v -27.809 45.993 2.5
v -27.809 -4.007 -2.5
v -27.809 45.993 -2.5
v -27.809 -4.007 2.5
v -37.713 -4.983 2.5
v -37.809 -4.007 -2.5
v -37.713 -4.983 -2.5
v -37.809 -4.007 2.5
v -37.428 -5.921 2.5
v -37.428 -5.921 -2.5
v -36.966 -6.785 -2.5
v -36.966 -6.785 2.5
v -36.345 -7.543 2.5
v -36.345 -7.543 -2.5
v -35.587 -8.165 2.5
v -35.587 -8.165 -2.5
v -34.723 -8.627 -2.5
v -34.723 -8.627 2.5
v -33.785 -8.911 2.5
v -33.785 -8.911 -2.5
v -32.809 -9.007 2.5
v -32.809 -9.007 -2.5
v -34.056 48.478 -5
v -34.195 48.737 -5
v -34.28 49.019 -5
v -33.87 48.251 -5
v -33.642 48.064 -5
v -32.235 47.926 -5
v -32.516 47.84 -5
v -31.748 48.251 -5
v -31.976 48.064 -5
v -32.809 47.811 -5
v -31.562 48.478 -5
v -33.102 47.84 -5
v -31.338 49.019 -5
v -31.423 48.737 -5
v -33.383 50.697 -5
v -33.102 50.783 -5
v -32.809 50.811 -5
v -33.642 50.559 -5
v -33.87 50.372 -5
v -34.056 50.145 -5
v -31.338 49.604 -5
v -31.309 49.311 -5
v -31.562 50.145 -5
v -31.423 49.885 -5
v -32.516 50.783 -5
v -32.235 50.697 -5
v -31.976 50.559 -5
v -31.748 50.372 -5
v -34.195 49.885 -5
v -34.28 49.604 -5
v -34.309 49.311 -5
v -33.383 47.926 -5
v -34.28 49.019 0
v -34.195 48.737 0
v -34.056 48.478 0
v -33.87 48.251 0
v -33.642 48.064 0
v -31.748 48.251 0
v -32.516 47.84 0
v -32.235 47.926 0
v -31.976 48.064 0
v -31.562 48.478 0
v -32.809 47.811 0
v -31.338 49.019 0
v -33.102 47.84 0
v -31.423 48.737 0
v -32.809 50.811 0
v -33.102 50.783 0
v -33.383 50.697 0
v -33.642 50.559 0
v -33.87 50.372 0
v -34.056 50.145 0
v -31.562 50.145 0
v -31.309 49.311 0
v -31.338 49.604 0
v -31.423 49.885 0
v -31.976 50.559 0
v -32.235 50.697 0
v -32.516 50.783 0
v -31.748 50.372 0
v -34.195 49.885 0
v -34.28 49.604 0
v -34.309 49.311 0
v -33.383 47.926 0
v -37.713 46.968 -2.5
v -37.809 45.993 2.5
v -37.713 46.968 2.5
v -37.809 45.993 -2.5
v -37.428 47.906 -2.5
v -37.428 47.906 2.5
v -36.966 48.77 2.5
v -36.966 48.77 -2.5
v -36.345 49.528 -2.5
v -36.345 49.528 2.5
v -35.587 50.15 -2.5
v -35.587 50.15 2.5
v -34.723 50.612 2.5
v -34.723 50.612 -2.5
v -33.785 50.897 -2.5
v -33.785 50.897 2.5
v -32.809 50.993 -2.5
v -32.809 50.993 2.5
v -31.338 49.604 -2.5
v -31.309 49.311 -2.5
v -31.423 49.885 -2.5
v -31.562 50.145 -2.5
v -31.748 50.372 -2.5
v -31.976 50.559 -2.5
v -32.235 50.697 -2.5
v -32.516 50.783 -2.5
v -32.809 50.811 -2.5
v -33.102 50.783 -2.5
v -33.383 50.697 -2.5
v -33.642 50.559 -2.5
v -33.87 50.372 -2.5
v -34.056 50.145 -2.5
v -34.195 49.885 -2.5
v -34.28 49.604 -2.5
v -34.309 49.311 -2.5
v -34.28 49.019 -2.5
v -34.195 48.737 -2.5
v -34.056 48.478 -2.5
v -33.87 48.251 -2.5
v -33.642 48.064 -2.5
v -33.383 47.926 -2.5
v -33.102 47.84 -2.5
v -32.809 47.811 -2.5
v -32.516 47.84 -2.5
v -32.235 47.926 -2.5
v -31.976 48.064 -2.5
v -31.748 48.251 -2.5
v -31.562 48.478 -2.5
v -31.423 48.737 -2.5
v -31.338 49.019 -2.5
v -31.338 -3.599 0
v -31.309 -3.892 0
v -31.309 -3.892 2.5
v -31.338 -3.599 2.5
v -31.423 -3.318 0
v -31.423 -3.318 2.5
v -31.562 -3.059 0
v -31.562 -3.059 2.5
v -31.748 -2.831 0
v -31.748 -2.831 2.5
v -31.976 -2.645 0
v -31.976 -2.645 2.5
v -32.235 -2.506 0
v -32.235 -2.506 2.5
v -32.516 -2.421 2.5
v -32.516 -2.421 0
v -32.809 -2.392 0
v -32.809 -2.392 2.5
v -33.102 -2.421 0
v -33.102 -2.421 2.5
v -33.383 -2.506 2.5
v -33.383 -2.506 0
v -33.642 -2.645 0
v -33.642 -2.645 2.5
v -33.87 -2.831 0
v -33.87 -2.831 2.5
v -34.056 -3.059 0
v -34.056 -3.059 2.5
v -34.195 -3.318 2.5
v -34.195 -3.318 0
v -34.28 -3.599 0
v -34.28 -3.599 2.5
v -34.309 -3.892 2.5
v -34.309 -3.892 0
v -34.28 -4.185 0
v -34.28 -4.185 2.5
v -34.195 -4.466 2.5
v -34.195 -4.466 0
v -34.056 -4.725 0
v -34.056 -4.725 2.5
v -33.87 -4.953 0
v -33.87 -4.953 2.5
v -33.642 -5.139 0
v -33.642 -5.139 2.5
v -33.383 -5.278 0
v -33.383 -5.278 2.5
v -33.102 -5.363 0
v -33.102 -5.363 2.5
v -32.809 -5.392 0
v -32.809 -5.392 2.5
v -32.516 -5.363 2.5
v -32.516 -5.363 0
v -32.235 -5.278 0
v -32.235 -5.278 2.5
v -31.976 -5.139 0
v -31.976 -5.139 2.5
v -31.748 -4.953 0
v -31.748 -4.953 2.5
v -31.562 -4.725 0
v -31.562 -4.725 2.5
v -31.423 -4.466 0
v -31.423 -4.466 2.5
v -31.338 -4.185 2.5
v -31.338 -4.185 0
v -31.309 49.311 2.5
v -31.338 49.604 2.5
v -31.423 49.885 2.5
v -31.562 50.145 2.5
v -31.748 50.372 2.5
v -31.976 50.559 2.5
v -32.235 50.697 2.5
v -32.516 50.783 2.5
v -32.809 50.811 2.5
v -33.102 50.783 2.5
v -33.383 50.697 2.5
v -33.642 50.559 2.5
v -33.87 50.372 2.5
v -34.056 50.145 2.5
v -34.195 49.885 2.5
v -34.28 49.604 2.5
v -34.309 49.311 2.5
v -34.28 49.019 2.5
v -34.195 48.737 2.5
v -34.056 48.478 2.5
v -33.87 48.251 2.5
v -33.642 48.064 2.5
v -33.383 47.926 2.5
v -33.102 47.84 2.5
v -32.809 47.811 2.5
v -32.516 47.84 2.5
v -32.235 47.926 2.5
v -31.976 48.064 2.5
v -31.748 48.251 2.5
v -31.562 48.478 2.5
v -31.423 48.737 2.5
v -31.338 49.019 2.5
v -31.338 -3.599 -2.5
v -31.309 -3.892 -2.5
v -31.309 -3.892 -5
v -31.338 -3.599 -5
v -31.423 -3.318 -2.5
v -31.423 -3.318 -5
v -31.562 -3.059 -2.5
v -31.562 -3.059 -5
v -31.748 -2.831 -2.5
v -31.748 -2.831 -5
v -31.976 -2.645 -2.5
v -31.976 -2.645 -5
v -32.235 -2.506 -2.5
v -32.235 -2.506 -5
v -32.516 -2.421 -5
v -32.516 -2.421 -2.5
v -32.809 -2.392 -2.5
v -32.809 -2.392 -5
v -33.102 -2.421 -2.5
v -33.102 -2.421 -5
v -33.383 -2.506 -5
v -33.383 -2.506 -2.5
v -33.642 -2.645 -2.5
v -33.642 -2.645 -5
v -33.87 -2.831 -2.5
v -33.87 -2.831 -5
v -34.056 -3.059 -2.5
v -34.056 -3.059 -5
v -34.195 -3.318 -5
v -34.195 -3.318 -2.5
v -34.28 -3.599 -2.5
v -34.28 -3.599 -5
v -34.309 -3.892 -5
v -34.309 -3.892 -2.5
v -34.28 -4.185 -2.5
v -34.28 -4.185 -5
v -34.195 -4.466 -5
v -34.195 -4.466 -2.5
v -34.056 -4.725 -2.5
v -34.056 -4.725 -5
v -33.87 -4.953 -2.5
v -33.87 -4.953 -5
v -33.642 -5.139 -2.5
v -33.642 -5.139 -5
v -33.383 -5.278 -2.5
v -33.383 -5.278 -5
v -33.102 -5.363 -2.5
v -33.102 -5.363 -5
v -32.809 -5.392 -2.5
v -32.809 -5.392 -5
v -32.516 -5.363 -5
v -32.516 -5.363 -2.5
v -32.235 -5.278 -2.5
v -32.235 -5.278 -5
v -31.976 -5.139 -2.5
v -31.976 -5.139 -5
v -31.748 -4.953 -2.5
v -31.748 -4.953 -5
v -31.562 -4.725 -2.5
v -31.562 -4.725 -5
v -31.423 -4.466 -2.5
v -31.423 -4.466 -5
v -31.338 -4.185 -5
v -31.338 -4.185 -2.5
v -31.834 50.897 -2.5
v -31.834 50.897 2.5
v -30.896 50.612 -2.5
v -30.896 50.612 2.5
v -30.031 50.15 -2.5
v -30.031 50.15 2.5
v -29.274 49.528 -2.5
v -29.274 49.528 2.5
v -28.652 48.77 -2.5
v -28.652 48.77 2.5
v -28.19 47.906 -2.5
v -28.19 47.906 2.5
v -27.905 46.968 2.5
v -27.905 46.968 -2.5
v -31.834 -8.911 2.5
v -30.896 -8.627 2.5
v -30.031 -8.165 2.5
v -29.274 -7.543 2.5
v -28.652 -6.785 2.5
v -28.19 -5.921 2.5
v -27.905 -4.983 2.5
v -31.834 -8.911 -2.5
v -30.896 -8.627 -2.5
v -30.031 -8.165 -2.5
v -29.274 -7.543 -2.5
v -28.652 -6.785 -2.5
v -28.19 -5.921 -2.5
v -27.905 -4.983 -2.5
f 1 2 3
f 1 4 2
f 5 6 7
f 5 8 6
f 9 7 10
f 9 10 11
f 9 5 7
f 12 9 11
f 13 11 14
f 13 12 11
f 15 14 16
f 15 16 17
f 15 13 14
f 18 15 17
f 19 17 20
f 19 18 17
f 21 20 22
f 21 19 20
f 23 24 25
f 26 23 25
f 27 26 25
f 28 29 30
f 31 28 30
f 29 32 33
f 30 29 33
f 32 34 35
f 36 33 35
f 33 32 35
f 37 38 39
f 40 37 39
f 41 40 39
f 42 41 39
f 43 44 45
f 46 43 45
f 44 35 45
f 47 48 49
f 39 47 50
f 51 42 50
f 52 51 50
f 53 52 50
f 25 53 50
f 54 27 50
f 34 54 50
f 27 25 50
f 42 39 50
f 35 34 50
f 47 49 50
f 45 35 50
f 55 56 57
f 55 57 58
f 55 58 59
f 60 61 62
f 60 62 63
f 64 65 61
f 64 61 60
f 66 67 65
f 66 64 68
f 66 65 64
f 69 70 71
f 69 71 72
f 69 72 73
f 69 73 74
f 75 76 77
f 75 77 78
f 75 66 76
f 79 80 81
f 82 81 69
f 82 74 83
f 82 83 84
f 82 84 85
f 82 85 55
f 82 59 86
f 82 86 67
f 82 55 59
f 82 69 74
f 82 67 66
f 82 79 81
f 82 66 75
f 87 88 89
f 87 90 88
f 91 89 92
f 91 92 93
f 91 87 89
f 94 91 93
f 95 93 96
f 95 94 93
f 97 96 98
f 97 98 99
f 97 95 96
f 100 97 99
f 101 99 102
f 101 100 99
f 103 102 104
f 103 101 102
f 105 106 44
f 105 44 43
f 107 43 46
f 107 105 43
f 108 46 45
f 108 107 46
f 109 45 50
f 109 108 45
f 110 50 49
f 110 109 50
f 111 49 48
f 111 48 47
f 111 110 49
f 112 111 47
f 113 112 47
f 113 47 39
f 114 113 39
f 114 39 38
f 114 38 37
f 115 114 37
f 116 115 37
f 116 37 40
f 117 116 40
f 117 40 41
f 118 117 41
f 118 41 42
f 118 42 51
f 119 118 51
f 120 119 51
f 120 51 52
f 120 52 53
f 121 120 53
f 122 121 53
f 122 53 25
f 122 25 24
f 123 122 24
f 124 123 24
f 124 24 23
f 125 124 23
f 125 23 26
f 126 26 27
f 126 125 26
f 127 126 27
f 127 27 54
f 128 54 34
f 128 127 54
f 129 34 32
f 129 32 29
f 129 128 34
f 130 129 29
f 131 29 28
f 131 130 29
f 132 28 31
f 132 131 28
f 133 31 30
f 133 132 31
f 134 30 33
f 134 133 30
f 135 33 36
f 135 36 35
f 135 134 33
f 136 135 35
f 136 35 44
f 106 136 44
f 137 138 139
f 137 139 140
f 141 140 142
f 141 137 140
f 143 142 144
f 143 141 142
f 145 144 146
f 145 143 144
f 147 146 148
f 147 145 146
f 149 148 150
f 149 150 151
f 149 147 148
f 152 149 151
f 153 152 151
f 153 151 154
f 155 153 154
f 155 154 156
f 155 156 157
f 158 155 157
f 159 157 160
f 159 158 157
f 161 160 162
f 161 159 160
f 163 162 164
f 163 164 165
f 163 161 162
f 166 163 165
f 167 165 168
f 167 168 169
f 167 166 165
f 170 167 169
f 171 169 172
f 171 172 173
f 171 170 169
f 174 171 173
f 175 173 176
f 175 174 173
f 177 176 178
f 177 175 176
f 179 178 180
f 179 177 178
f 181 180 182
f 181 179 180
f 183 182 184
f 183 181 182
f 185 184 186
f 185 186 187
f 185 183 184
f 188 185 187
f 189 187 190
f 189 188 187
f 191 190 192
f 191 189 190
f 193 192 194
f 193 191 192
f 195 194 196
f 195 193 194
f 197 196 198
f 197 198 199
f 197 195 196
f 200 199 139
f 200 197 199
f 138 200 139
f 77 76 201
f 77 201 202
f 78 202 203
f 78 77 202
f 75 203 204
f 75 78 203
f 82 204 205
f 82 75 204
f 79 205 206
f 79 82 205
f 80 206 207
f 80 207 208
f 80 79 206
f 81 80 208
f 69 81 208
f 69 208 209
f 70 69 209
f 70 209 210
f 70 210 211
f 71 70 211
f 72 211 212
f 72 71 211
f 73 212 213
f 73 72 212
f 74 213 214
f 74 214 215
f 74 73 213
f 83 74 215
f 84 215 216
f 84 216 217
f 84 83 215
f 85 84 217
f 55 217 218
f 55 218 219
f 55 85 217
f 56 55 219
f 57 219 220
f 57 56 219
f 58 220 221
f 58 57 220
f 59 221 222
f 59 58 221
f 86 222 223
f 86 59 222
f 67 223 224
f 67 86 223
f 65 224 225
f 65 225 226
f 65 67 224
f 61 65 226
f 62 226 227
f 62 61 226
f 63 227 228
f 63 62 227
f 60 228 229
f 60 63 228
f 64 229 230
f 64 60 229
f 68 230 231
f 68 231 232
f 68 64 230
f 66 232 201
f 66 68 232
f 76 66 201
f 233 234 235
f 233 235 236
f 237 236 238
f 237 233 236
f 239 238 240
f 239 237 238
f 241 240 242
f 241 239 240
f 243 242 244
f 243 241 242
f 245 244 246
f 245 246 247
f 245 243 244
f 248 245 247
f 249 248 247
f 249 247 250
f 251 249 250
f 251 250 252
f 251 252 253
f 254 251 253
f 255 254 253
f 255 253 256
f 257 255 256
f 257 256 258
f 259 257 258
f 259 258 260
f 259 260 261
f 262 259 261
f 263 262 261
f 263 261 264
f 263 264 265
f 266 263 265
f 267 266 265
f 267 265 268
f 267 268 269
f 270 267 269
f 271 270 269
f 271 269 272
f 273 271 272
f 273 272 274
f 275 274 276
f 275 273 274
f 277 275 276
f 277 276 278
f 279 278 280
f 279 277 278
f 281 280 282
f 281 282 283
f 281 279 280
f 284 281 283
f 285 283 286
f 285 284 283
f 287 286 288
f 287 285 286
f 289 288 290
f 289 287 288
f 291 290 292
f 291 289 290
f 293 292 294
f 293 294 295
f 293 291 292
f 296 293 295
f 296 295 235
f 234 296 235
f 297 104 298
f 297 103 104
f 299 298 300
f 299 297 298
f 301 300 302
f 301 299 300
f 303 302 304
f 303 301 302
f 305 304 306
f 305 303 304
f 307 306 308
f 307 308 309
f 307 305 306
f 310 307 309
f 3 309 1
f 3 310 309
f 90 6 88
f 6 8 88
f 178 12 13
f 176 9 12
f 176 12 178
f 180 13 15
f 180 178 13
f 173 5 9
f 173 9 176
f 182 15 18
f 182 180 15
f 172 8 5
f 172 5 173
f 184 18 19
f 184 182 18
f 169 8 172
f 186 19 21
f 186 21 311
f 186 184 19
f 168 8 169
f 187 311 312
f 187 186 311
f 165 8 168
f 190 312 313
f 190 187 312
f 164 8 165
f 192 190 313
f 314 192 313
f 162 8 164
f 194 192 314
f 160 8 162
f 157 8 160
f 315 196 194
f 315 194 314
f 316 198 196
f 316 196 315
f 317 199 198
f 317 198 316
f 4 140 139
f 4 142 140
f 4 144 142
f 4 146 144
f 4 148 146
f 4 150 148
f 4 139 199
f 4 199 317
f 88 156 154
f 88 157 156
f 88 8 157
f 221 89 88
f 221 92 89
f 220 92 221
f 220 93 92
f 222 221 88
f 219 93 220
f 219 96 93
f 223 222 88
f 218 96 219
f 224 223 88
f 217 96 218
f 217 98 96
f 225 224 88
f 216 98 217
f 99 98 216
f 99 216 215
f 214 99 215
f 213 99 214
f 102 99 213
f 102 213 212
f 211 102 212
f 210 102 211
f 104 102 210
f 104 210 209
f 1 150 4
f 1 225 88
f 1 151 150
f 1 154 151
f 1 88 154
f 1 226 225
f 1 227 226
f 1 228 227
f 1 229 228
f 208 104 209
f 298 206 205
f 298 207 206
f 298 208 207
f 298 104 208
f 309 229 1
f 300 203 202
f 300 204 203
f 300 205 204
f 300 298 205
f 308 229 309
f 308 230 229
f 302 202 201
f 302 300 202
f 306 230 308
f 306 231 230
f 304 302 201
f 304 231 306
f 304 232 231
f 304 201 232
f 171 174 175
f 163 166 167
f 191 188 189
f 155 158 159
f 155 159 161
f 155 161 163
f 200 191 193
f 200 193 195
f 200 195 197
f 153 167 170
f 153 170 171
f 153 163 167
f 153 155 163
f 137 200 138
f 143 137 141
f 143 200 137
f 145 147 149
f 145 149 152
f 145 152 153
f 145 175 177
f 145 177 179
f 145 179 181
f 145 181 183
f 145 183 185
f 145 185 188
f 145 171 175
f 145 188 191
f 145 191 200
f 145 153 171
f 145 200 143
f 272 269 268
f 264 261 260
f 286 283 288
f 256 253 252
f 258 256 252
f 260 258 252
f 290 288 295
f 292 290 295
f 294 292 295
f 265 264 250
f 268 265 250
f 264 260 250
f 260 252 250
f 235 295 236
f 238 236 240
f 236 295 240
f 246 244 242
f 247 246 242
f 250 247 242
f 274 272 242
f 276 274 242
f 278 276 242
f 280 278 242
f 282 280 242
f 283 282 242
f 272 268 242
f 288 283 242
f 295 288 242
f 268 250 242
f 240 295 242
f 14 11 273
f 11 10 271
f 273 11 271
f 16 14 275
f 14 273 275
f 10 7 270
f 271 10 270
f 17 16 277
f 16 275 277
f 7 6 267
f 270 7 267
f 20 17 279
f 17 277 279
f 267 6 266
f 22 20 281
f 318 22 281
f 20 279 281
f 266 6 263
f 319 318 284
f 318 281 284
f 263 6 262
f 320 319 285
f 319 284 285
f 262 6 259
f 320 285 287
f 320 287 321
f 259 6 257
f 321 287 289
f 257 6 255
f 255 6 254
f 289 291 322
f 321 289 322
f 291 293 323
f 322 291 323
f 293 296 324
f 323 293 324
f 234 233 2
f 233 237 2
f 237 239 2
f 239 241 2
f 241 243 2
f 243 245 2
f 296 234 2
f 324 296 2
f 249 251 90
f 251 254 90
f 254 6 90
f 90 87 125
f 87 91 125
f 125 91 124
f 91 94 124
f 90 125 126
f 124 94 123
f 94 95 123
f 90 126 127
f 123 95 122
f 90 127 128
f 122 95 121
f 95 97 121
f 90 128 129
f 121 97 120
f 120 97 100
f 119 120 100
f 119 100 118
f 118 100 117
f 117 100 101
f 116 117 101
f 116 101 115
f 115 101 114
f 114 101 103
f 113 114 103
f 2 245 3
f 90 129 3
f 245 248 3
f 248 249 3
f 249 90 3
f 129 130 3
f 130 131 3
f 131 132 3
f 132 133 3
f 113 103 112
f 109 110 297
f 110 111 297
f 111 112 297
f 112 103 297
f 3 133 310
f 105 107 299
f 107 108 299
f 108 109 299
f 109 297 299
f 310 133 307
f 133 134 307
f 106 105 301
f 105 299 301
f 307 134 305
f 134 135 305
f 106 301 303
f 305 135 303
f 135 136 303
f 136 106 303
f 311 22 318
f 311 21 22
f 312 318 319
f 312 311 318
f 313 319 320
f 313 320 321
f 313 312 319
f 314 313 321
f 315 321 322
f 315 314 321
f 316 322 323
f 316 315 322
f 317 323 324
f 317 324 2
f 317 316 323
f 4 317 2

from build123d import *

# Parameters (mm, degrees)
F0_W     = 10
F0_H     = 60
F0_R     = 1.5
F1_DEPTH = 2.5
F2_DEPTH = 5
F3_R     = 4.99999


# Not quite as in the source:
# - a fillet or chamfer is up to 0.001 mm smaller than in the source, because OpenCascade refuses the exact size


with BuildPart() as f1:
    # F0 (on Top) → F1 (new body, symmetric)
    with BuildSketch(Plane.XY):
        with Locations((-32.8091010451, 20.9925968945)):
            Rectangle(F0_W, F0_H)
        with Locations((-32.8091010451, -3.8919287648)):
            Circle(F0_R, mode=Mode.SUBTRACT)
        with Locations((-32.8091010451, 49.3113994598)):
            Circle(F0_R, mode=Mode.SUBTRACT)
    extrude(amount=F1_DEPTH, both=True)

    # F0 (on Top) → F2 (join)
    with BuildSketch(Plane.XY):
        with Locations((-32.8091010451, 49.3113994598)):
            Circle(F0_R)
        with Locations((-32.8091010451, -3.8919287648)):
            Circle(F0_R)
    extrude(amount=-F2_DEPTH)

    # F3 (radius 5 in the source; OpenCascade refuses exactly that, so slightly less here)
    f3_edges = [f1.edges().sort_by_distance(p)[0] for p in [
        (-27.809101, 50.992597, 0),
        (-37.809101, 50.992597, 0),
        (-27.809101, -9.007403, 0),
        (-37.809101, -9.007403, 0),
    ]]
    fillet(f3_edges, radius=F3_R)


solid = f1.part
